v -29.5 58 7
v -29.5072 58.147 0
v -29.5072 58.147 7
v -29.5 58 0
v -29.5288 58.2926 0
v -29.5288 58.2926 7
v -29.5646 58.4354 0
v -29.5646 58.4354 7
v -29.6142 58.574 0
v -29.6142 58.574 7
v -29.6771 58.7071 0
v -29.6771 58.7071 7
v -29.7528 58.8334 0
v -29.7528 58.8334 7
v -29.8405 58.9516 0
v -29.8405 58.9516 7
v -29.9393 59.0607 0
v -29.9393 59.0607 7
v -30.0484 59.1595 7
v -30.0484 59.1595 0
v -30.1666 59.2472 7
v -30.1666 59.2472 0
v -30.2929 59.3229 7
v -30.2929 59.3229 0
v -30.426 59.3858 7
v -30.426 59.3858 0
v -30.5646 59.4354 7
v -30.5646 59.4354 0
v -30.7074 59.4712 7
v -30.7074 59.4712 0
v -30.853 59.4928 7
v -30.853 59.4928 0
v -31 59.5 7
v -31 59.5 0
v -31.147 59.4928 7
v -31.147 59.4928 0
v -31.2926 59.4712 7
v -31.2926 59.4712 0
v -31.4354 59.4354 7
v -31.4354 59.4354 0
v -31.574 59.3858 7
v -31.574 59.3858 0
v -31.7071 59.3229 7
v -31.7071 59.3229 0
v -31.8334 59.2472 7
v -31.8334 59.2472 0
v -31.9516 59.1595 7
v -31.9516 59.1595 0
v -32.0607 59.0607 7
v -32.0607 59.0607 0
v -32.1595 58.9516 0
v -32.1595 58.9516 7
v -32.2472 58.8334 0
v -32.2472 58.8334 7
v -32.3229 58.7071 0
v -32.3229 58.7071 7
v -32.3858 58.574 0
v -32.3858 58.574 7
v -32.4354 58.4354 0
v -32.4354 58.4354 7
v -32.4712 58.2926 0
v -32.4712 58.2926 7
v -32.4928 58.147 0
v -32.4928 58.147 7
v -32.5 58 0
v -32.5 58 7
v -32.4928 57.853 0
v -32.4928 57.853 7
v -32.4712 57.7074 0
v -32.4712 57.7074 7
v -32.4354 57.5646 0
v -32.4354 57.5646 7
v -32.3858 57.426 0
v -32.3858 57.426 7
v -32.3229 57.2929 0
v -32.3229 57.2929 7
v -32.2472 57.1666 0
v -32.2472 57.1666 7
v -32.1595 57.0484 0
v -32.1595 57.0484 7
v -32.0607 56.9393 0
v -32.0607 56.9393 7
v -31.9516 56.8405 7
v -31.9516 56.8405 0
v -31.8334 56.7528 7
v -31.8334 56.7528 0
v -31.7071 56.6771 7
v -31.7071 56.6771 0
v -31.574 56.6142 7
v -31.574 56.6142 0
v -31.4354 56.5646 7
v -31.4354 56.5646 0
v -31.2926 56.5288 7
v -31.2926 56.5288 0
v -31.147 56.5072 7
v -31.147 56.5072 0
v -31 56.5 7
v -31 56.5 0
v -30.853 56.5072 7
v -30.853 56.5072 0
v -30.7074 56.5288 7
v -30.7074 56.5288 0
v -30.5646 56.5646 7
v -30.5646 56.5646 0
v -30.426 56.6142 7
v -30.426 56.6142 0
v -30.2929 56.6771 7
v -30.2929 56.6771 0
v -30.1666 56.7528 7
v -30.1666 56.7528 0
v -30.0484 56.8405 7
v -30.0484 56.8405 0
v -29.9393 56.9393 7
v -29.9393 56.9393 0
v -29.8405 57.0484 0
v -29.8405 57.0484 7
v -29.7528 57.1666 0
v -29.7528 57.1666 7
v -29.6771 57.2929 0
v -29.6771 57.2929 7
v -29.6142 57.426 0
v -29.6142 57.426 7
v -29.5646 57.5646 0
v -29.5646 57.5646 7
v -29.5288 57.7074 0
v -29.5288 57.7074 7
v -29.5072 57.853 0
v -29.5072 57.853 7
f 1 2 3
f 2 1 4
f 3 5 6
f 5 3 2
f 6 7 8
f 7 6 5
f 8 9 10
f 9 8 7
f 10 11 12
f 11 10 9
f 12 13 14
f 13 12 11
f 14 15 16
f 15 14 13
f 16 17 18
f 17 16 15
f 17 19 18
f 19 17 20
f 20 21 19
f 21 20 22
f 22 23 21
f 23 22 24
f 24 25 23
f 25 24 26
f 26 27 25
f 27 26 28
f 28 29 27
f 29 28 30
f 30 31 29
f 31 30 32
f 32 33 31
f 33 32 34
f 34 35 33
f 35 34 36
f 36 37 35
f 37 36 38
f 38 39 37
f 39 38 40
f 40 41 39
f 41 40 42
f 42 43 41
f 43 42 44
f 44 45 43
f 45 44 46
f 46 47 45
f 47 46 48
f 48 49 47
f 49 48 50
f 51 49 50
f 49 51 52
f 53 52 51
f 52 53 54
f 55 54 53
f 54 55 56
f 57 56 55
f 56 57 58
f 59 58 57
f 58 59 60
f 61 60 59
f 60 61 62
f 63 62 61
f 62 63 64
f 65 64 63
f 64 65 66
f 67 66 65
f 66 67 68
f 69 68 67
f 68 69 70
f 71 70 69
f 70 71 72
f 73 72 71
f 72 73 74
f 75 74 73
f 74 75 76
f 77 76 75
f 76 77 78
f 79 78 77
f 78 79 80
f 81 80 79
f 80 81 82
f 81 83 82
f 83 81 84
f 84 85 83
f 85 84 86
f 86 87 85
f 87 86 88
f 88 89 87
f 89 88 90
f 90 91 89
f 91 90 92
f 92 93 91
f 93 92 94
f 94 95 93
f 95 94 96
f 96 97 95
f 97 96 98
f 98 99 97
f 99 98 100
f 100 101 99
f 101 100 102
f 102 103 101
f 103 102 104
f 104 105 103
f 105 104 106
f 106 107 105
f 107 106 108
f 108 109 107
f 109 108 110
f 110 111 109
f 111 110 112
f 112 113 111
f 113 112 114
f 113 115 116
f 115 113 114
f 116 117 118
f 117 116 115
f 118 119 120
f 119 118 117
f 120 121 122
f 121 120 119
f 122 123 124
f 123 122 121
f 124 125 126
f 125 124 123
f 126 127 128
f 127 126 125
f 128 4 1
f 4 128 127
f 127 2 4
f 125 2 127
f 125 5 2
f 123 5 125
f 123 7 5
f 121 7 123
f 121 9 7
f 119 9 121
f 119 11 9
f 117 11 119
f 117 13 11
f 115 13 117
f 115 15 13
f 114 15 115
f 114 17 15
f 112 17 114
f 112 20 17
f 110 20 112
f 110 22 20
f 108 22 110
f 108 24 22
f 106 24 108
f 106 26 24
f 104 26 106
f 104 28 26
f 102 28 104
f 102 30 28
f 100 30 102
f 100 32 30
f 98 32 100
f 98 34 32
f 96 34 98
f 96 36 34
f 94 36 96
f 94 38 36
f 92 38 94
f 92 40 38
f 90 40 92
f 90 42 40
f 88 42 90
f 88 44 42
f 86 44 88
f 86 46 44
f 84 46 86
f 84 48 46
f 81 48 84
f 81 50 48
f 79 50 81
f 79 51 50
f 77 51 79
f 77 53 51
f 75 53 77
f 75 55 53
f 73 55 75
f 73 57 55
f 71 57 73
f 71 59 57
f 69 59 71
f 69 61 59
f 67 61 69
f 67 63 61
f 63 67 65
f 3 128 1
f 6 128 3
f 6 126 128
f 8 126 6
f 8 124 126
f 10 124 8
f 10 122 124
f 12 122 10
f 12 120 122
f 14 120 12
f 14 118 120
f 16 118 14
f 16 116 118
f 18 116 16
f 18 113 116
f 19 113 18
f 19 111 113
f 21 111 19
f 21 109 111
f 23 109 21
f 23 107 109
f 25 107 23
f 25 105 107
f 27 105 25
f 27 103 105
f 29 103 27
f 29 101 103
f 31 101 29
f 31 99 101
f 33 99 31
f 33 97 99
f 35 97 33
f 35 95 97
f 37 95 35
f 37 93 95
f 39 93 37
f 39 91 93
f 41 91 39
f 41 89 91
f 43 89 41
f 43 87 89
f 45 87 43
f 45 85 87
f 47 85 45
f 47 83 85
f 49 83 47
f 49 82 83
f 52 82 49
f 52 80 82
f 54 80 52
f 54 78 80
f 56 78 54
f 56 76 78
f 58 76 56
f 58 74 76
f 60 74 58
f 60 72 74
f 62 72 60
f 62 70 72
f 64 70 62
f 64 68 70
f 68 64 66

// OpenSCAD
// file: ../dimensions.scad
// dimensions.scad — single source of truth for all tray geometry constants.
//
// All values in millimetres unless otherwise noted.
// Sources:
//   - CD/DVD drive envelope: SFF-8551 (5.25" half-height) and laptop slim ODD (9.5 mm)
//   - CD disc geometry: ECMA-130
//   - MiniDisc cartridge: Sony MiniDisc specification (MD)
//   - Issues weyucou/minidisc-tray#1 (3D modeling format research) and
//     weyucou/minidisc-tray#2 (CD/DVD tray dimensions)


// ---------------------------------------------------------------------------
// CD/DVD drive envelope (target form factor)
// ---------------------------------------------------------------------------

// Primary target: 5.25" half-height (SFF-8551) drive body.
DRIVE_BODY_W = 146.1;   // outer width
DRIVE_BODY_H = 41.3;    // outer height
DRIVE_BODY_D = 170;     // outer depth (typical; range 170–203)

// Slim laptop ODD (9.5 mm) — secondary parametric variant.
SLIM_BODY_W = 128;
SLIM_BODY_H = 9.5;
SLIM_BODY_D = 127;


// ---------------------------------------------------------------------------
// CD tray envelope (the cavity the printed tray must fit into)
// ---------------------------------------------------------------------------

// Inner tray usable width — the lateral envelope between the tray side walls.
// Derived in #2: ~63 mm from spindle centre to each side wall.
TRAY_INNER_W = 126;

// Spindle-centre-to-front-bezel distance.
// Range observed across donor drives: 80–95 mm.
// Default = mid-range; UPDATE after physical measurement of the actual donor drive.
SPINDLE_TO_BEZEL = 88;

// CD program area (informational — used to validate spindle clearance).
// ECMA-130: program area lies between r=25 and r=58 mm.
CD_DISC_DIA = 120;
CD_CENTER_HOLE = 15;
CD_CLAMP_R_MIN = 26;
CD_CLAMP_R_MAX = 33;

// Inner tray usable depth — derived from spindle-to-bezel + CD radius + rear margin.
// Matches typical 5.25" half-height CD tray depth. Refine when donor drive measured.
TRAY_INNER_D = SPINDLE_TO_BEZEL + CD_DISC_DIA / 2 + 10;

// Spindle clearance hole radius — clears the CD spindle hub / clamp area.
// Sized at CD_CLAMP_R_MAX + 1 mm safety; also clears the MD internal disc edge.
SPINDLE_CLEARANCE_R = CD_CLAMP_R_MAX + 1;


// ---------------------------------------------------------------------------
// MiniDisc cartridge (the part the tray must position and shutter-actuate)
// ---------------------------------------------------------------------------

// Cartridge outer dimensions — Sony MD spec.
MD_W = 72;   // width  (along shutter slide axis)
MD_D = 68;   // depth  (perpendicular to shutter slide)
MD_H = 5;    // thickness

// Internal disc — used for spindle-clearance hole sizing and centring checks.
MD_DISC_DIA = 64;
MD_CENTER_HOLE = 11;


// ---------------------------------------------------------------------------
// Print and fit tolerances
// ---------------------------------------------------------------------------

// Per-side print clearance applied to mating surfaces (tray-to-cavity, MD pocket).
// Tuned for AFINIA H400+ FDM with default Afinia Studio profile.
FIT_CLEARANCE = 0.4;

// OpenSCAD render facet count for circular features.
// Higher = smoother curves at the cost of render time.
$fn = 64;


// ---------------------------------------------------------------------------
// Tray geometry (design constants)
// ---------------------------------------------------------------------------

// Tray base plate thickness — chosen for FDM stiffness across the full footprint.
// Must exceed MD_POCKET_DEPTH so the pocket leaves a continuous floor.
TRAY_BASE_THICKNESS = 4.0;

// MD pocket recess depth — how far the cartridge sits below the tray surface.
// MD_H = 5 mm; a 3 mm recess leaves the cartridge ~2 mm proud, easy to grip.
MD_POCKET_DEPTH = 3.0;

// Shutter actuator pin geometry — engages the MD cartridge shutter tab from
// inside the pocket as the cartridge is slid into final position.
SHUTTER_PIN_DIA = 3.0;
SHUTTER_PIN_H = 6.0;

// Shutter tab engagement position, measured from the leading corner of the
// MD pocket. Approximate; refine against a physical Sony MD cartridge.
SHUTTER_TAB_X_OFFSET = 5.0;
SHUTTER_TAB_Y_OFFSET = 4.0;
// main file
// shutter_actuator.scad — fixed pin that engages the MD shutter tab.
//
// Produces a positive cylinder intended to be unioned with the tray base.
// The pin runs from the bottom of the tray base (Z = 0) up to (pocket-floor +
// pin_h), so its lower portion fuses with the pocket floor and its upper
// portion stands proud inside the pocket — engaging the cartridge shutter
// tab as the MD is slid into final position.
//
// Pin position is derived from the MD pocket's near corner (the loading-side
// corner of the cartridge). Offsets are approximate; refine against a
// physical Sony MD cartridge.

include <../dimensions.scad>;

module shutter_actuator(
    spindle_to_bezel = SPINDLE_TO_BEZEL,
    base_thickness = TRAY_BASE_THICKNESS,
    pocket_depth = MD_POCKET_DEPTH,
    pin_dia = SHUTTER_PIN_DIA,
    pin_h = SHUTTER_PIN_H,
    tab_x_offset = SHUTTER_TAB_X_OFFSET,
    tab_y_offset = SHUTTER_TAB_Y_OFFSET
) {
    pin_x = -MD_W / 2 + tab_x_offset;
    pin_y = spindle_to_bezel - MD_D / 2 + tab_y_offset;
    floor_z = base_thickness - pocket_depth;

    translate([pin_x, pin_y, 0])
        cylinder(h = floor_z + pin_h, d = pin_dia);
}

shutter_actuator();
